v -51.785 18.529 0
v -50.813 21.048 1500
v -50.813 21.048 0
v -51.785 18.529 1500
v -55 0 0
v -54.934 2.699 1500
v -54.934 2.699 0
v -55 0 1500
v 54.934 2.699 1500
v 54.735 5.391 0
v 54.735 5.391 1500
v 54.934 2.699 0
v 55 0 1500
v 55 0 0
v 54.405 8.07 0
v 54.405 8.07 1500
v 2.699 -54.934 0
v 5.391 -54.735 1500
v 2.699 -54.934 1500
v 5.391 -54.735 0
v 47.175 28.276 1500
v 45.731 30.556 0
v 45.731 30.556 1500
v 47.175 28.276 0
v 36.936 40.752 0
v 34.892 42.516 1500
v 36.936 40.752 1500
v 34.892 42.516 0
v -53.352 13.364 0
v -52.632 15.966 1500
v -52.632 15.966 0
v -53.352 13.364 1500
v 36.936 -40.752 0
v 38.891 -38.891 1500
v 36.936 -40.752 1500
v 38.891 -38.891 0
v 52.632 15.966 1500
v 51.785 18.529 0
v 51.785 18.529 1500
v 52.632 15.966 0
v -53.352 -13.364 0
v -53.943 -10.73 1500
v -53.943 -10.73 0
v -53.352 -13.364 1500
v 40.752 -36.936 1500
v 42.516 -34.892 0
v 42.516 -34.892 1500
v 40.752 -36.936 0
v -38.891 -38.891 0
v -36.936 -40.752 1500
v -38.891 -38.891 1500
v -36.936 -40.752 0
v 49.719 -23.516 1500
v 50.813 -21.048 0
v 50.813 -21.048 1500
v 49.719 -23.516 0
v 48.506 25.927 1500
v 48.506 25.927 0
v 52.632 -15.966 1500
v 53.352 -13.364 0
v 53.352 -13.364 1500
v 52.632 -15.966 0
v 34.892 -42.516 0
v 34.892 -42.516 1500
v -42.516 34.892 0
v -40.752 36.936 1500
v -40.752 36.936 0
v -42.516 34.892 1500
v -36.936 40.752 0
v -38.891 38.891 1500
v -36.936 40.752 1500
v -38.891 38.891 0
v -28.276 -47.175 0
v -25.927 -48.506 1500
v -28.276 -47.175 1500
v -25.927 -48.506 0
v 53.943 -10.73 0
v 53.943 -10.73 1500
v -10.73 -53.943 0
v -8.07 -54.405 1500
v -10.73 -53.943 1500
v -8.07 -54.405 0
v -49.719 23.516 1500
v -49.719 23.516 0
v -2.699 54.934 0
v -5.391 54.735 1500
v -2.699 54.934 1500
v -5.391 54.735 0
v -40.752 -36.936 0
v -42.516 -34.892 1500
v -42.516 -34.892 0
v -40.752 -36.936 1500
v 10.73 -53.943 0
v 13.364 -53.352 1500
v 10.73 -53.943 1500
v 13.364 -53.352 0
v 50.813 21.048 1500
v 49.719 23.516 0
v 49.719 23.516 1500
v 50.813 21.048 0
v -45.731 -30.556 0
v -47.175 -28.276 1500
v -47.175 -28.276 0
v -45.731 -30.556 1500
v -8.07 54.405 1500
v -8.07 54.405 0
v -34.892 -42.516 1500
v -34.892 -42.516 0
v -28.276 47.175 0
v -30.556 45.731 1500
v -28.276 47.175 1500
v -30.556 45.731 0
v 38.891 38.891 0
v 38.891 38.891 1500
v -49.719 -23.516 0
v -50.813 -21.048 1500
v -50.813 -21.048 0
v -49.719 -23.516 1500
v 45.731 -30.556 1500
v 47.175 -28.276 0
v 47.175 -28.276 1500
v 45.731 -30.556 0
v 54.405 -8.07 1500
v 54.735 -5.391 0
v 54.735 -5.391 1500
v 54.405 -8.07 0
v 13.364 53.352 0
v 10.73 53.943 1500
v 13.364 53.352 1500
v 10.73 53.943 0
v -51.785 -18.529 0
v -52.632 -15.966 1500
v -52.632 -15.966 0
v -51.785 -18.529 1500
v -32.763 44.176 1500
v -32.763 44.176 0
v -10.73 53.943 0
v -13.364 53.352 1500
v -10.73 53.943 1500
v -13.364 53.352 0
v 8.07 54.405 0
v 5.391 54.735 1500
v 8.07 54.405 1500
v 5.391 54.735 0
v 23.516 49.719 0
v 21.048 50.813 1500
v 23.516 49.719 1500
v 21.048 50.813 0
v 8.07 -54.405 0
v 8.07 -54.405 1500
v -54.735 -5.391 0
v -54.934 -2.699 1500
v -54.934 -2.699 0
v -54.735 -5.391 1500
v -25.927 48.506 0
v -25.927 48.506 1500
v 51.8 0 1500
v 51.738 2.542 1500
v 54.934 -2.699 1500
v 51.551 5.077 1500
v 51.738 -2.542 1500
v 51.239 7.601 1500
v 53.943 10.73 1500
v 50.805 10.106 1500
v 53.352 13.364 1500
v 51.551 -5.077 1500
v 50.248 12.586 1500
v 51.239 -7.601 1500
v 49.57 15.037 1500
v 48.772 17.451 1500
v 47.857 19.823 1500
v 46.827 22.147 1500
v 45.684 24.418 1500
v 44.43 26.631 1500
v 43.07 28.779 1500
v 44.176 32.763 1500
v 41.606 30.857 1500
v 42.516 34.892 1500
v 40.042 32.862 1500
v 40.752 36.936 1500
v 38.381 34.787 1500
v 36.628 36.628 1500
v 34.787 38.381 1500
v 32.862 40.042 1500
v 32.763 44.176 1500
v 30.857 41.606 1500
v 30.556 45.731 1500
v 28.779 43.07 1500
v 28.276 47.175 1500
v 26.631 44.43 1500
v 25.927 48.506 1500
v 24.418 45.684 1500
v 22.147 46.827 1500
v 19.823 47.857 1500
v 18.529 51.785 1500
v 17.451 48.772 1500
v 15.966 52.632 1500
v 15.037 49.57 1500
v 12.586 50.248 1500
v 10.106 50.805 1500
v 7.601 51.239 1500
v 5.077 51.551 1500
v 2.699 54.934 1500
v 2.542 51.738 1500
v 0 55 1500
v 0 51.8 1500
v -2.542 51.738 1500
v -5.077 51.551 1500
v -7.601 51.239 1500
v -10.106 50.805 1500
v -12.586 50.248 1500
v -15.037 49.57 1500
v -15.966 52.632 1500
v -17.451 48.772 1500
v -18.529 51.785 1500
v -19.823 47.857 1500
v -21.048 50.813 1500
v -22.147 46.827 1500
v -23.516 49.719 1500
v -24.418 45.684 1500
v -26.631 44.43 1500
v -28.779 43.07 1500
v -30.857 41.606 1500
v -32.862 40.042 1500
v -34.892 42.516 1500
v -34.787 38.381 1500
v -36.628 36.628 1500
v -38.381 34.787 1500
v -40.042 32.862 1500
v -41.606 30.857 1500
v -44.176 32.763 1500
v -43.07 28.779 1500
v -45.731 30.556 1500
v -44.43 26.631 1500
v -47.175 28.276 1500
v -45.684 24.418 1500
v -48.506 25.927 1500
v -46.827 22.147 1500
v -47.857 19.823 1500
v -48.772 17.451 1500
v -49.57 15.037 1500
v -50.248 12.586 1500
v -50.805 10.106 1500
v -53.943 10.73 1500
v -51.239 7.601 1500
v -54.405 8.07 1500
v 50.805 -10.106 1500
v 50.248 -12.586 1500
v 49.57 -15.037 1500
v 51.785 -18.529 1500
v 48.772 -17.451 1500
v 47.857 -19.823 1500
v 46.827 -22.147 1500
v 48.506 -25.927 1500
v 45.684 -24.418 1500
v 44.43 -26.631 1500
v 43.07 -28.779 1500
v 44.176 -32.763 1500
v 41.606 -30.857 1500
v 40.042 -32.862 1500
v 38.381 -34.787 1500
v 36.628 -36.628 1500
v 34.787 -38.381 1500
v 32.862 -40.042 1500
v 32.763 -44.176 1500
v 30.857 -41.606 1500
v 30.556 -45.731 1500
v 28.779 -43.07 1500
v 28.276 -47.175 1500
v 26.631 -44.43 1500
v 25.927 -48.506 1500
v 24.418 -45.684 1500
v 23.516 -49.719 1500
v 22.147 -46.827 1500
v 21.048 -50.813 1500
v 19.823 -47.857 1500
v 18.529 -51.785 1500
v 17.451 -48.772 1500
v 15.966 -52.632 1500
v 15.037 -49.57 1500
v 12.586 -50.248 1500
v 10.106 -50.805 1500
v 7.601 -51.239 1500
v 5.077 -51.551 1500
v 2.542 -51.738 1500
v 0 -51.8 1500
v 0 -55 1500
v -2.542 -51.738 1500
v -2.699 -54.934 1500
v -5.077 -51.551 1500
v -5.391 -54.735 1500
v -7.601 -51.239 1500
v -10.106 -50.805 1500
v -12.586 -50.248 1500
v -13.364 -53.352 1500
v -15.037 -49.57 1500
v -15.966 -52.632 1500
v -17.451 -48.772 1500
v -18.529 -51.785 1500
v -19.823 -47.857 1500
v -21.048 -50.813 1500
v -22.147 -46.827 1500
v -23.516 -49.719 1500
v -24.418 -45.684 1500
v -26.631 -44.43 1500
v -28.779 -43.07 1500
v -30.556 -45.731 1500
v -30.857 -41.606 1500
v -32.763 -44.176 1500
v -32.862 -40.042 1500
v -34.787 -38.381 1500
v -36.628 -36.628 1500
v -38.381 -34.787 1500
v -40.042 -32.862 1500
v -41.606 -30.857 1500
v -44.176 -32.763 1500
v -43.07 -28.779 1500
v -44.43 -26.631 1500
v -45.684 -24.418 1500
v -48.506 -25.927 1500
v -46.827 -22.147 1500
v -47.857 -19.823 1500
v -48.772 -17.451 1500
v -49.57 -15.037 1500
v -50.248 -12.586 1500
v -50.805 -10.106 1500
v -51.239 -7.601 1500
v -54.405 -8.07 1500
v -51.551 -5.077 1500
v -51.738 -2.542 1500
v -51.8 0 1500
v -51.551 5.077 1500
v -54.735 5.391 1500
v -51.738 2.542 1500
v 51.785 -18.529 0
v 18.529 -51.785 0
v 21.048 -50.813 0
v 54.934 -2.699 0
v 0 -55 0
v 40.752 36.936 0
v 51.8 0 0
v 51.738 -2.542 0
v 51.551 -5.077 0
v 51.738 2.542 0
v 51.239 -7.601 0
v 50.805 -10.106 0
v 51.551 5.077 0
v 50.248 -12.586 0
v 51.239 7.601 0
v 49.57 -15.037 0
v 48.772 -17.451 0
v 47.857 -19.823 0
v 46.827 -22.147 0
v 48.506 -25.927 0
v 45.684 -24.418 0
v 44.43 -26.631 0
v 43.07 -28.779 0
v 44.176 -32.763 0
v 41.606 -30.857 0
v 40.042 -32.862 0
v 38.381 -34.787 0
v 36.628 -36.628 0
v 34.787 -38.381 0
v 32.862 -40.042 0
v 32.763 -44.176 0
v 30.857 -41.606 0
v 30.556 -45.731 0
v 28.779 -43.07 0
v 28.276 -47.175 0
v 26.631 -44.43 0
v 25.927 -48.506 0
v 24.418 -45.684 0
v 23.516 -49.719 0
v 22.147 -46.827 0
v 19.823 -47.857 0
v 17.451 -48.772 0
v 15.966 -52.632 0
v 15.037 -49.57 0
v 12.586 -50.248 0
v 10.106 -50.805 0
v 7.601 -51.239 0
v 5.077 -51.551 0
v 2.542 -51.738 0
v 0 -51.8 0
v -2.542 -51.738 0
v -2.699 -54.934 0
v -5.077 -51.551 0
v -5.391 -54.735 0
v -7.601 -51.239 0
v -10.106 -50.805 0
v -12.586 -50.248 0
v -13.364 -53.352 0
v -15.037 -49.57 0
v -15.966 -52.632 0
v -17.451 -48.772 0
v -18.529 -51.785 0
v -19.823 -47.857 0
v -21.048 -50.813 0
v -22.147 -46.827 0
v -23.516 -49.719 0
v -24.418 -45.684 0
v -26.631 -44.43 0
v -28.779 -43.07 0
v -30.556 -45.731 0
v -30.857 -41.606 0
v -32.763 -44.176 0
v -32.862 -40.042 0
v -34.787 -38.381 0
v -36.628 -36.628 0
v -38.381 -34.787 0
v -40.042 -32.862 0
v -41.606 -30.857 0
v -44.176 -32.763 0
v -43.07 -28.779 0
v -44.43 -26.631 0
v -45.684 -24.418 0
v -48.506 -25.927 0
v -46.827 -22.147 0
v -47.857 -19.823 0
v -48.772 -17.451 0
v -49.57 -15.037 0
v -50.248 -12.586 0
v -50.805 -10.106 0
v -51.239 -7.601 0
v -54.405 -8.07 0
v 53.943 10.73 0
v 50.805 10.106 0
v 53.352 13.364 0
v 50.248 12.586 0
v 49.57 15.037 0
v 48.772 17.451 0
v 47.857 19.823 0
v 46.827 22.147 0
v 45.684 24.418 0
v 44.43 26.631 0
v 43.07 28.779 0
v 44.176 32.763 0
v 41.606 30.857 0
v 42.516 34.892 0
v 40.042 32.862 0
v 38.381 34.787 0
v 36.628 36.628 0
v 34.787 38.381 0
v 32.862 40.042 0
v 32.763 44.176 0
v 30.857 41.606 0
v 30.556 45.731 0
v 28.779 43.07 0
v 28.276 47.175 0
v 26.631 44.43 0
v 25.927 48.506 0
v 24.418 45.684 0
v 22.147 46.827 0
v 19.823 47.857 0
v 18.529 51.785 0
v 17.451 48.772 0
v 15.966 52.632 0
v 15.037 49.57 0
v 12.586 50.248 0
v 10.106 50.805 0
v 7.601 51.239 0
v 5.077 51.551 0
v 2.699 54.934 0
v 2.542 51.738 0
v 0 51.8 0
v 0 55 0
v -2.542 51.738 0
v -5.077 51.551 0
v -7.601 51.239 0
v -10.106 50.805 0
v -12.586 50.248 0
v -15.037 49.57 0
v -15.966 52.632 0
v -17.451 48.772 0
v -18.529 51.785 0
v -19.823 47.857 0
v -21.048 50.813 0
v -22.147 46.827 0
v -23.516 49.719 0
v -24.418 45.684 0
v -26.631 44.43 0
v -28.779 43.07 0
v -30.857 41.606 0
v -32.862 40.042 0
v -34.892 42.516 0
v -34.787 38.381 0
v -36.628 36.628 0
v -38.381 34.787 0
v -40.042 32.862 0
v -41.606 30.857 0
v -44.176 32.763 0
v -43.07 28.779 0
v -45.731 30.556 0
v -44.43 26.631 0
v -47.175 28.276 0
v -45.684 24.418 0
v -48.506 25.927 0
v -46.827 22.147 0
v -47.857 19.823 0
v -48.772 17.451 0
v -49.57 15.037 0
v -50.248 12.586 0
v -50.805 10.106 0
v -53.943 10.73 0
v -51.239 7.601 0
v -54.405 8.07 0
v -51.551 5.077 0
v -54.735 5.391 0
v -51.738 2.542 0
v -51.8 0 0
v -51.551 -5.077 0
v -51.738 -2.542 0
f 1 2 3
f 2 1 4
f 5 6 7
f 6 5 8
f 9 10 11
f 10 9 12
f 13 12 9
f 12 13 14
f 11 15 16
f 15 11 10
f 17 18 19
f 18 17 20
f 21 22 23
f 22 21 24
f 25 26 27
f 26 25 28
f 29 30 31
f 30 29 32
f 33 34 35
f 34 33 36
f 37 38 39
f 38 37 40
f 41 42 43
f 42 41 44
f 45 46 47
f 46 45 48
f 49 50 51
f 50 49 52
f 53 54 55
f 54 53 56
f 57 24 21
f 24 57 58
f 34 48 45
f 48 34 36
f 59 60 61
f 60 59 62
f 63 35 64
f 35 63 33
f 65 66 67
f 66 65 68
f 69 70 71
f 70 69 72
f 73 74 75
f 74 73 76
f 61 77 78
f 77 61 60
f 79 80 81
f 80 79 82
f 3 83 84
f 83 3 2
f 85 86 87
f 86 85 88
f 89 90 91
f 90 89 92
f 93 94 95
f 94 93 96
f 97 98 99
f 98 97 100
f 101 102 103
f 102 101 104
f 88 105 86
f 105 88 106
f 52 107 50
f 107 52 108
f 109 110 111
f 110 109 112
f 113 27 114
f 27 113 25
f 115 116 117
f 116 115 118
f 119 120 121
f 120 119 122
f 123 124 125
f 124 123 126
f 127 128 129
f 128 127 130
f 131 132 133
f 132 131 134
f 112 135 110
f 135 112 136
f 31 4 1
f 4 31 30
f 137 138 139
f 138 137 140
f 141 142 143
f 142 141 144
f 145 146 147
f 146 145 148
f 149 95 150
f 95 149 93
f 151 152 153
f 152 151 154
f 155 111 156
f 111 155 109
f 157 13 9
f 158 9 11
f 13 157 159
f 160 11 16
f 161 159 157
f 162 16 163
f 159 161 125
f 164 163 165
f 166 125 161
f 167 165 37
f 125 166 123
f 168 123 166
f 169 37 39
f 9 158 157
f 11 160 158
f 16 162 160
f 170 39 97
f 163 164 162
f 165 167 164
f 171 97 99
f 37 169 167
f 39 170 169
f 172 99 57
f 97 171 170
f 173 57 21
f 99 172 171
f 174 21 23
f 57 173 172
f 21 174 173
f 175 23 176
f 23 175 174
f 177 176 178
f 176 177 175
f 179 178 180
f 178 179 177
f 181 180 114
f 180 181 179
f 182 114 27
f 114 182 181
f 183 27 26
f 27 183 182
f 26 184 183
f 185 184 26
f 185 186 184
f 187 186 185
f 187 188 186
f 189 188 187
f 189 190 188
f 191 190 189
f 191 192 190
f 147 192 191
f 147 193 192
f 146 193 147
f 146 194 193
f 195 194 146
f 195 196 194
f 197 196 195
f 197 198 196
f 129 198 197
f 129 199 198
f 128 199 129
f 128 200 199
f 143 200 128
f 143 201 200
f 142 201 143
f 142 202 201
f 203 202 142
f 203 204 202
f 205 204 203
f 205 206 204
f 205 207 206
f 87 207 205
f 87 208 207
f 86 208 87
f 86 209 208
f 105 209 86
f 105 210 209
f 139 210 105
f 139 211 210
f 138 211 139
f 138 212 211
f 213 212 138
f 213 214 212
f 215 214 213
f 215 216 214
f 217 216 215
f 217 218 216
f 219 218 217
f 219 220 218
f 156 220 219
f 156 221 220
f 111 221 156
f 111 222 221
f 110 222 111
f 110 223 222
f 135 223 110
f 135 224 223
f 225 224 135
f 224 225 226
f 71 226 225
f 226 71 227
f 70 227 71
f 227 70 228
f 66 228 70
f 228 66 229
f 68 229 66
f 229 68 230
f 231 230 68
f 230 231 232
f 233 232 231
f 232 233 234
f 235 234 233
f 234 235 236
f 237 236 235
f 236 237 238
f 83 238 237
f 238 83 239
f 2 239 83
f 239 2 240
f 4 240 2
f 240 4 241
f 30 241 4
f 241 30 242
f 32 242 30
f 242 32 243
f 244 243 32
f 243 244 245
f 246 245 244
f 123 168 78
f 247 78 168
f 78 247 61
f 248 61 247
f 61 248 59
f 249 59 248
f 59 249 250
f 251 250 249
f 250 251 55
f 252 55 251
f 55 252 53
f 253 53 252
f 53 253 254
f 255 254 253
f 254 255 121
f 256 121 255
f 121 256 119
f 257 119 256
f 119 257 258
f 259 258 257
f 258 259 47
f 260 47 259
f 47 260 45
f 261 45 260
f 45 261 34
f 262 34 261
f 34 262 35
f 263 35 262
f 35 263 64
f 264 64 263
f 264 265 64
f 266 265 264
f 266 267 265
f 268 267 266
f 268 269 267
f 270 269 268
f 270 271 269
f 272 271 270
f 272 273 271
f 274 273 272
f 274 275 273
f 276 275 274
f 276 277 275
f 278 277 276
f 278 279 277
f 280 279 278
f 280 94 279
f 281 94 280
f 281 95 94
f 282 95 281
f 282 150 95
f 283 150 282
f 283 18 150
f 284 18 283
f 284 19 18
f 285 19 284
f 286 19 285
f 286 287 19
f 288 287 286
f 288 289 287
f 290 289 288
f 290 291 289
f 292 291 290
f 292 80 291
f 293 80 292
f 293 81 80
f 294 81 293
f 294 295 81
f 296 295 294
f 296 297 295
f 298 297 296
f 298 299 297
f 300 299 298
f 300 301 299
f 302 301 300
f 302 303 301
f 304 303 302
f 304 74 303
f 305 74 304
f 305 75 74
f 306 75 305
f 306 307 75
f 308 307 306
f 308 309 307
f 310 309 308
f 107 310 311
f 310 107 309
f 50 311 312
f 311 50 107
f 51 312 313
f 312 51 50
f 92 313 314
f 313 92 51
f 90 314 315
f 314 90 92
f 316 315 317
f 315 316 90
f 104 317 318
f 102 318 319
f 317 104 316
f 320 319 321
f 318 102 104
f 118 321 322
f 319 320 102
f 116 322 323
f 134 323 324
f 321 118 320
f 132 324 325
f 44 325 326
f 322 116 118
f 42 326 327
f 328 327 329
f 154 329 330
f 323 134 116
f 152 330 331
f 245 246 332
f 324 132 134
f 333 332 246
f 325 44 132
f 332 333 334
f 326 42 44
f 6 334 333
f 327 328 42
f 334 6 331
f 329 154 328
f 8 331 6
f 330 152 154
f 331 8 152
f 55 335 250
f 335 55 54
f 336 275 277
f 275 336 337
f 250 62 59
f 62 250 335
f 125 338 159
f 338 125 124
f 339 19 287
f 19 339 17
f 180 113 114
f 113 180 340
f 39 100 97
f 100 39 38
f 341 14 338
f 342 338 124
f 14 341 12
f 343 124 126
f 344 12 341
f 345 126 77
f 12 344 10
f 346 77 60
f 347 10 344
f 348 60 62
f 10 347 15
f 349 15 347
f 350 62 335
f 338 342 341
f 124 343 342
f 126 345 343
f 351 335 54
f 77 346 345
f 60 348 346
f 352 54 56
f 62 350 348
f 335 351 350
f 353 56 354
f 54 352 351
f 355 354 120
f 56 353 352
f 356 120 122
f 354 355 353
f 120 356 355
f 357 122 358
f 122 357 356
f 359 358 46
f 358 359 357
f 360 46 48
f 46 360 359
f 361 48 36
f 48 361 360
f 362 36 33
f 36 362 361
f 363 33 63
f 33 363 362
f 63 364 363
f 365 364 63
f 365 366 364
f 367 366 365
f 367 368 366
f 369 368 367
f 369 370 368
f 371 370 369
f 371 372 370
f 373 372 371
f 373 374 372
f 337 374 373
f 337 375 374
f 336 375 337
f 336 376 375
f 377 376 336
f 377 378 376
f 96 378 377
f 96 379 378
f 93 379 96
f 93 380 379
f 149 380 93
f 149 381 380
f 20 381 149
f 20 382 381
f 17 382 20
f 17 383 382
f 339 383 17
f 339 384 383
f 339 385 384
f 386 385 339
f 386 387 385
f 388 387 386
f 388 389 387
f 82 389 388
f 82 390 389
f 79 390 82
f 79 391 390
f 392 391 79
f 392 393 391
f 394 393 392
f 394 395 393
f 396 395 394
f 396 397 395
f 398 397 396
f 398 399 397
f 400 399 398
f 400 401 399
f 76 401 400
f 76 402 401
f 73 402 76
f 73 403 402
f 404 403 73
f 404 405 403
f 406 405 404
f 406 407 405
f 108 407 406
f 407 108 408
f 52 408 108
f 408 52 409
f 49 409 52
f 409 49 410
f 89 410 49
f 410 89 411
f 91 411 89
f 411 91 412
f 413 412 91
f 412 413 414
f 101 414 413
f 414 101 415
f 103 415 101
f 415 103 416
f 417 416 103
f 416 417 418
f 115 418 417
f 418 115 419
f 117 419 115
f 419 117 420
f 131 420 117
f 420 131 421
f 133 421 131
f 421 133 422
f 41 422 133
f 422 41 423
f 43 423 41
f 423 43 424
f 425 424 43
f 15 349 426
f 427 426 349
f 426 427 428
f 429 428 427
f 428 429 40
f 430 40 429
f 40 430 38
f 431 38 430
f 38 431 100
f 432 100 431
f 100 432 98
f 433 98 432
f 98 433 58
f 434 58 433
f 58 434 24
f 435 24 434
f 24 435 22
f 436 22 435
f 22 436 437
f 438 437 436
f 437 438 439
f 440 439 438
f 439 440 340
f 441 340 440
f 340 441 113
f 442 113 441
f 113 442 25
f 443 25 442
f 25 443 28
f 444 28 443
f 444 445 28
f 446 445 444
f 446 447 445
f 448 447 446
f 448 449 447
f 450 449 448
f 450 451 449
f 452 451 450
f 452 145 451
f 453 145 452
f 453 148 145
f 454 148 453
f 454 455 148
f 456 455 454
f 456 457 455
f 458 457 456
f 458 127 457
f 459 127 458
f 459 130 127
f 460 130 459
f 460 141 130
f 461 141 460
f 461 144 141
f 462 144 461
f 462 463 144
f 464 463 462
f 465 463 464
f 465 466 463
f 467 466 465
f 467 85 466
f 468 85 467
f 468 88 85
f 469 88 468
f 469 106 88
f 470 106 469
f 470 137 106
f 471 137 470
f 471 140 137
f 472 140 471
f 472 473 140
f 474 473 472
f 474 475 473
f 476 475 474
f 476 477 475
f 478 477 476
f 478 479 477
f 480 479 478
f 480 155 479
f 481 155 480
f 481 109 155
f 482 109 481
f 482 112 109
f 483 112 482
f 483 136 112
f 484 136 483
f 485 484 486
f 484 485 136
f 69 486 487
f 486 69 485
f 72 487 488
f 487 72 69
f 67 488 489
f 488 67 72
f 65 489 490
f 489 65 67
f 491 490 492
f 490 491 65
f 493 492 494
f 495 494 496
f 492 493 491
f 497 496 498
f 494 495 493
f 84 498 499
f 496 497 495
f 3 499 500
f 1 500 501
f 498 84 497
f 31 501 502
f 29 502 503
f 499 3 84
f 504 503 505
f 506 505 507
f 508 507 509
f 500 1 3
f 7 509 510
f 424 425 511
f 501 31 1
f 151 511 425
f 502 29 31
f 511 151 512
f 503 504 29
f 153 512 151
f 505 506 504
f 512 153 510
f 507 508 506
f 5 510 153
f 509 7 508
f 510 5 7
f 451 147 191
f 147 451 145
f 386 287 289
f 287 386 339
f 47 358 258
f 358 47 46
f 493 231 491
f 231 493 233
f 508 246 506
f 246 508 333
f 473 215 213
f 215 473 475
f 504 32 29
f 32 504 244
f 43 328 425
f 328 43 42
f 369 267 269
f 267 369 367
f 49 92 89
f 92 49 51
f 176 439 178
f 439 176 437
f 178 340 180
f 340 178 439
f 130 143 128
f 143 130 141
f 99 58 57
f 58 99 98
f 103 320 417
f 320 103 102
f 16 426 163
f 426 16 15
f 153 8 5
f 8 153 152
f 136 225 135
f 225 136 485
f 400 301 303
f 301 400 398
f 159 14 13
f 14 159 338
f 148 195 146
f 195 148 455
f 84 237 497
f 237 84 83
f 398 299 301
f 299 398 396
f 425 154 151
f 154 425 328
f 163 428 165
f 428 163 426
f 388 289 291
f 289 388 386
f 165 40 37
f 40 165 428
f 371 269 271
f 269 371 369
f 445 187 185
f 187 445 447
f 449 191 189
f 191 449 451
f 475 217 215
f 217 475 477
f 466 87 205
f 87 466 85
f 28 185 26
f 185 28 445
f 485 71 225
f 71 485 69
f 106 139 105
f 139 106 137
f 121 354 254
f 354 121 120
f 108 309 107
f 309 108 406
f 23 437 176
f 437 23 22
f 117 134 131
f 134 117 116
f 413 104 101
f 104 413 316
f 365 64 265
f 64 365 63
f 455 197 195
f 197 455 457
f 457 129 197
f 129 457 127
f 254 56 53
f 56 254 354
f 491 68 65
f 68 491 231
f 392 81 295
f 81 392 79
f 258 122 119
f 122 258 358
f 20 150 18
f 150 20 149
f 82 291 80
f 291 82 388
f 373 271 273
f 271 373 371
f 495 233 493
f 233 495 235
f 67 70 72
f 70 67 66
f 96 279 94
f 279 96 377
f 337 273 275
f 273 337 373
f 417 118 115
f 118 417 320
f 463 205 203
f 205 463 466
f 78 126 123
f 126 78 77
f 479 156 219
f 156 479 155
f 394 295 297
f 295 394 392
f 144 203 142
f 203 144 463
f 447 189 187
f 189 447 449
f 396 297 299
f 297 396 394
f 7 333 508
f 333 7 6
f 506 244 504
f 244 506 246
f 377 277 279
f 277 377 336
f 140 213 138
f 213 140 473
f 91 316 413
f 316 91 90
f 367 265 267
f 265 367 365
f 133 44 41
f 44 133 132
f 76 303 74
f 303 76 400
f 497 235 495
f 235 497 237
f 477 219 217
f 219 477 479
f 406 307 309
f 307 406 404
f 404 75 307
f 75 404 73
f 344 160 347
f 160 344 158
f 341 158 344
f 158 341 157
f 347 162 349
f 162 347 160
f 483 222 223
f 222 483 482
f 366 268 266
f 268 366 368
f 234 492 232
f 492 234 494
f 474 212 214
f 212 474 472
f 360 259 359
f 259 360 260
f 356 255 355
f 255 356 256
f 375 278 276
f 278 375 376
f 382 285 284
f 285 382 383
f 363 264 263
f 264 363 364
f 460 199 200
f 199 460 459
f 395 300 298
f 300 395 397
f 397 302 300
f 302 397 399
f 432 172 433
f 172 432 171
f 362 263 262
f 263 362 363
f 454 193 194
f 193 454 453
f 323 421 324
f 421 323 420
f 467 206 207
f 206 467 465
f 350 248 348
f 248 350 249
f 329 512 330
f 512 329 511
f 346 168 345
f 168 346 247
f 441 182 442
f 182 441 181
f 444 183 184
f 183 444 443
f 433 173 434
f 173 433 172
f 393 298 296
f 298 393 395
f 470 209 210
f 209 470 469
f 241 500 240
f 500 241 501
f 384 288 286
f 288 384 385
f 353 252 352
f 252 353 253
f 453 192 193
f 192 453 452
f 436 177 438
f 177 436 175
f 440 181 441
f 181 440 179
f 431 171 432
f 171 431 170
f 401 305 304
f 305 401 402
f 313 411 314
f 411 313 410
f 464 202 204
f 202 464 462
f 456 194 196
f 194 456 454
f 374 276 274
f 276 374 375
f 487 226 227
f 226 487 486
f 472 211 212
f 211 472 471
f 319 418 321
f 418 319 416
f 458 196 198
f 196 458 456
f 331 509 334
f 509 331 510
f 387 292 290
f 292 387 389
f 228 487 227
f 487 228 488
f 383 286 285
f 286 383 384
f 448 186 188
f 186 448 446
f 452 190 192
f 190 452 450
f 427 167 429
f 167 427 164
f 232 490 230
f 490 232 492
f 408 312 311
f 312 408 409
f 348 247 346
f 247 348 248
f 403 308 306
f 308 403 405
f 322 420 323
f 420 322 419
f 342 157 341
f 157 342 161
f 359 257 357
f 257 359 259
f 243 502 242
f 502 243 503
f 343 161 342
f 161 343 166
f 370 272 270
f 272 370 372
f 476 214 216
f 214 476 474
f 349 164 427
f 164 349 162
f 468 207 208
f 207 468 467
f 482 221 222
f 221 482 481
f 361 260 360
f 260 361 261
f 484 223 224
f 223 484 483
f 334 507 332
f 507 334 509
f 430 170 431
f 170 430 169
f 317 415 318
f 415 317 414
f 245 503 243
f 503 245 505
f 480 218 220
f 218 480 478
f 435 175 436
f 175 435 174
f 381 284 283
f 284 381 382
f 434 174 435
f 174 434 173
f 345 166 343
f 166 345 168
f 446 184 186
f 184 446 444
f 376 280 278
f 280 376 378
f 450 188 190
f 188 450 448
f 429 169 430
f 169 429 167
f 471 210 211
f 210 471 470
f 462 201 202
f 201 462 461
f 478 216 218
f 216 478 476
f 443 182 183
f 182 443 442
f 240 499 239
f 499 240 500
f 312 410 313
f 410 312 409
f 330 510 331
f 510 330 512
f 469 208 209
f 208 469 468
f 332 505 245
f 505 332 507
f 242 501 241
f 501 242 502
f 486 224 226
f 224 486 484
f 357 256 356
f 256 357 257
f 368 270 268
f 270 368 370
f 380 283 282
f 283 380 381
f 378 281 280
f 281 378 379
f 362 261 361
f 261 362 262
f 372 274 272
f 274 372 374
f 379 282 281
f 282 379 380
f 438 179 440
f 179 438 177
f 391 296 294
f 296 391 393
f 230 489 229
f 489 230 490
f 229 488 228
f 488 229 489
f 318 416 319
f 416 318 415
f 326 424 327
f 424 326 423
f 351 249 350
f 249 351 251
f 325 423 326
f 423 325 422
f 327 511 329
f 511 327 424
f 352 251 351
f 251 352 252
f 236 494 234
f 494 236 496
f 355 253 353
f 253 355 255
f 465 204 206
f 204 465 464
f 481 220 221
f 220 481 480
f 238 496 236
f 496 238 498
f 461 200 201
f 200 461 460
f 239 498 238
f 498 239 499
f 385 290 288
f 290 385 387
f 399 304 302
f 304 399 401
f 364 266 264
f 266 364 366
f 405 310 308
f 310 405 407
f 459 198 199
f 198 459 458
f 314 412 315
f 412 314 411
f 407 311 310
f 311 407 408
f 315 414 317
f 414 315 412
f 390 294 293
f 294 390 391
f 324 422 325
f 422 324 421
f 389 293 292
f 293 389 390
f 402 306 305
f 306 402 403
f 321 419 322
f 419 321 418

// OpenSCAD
$fn = 128;

// HT pipe parameters (approximate for HT 110)
// Units: mm
pipe_length = 1500;
outer_diameter = 110;
wall_thickness = 3.2;

inner_diameter = outer_diameter - 2 * wall_thickness;

module ht_pipe(od, id, len) {
    difference() {
        cylinder(h = len, d = od, center = false);
        translate([0, 0, -0.5])
            cylinder(h = len + 1, d = id, center = false);
    }
}

ht_pipe(outer_diameter, inner_diameter, pipe_length);
